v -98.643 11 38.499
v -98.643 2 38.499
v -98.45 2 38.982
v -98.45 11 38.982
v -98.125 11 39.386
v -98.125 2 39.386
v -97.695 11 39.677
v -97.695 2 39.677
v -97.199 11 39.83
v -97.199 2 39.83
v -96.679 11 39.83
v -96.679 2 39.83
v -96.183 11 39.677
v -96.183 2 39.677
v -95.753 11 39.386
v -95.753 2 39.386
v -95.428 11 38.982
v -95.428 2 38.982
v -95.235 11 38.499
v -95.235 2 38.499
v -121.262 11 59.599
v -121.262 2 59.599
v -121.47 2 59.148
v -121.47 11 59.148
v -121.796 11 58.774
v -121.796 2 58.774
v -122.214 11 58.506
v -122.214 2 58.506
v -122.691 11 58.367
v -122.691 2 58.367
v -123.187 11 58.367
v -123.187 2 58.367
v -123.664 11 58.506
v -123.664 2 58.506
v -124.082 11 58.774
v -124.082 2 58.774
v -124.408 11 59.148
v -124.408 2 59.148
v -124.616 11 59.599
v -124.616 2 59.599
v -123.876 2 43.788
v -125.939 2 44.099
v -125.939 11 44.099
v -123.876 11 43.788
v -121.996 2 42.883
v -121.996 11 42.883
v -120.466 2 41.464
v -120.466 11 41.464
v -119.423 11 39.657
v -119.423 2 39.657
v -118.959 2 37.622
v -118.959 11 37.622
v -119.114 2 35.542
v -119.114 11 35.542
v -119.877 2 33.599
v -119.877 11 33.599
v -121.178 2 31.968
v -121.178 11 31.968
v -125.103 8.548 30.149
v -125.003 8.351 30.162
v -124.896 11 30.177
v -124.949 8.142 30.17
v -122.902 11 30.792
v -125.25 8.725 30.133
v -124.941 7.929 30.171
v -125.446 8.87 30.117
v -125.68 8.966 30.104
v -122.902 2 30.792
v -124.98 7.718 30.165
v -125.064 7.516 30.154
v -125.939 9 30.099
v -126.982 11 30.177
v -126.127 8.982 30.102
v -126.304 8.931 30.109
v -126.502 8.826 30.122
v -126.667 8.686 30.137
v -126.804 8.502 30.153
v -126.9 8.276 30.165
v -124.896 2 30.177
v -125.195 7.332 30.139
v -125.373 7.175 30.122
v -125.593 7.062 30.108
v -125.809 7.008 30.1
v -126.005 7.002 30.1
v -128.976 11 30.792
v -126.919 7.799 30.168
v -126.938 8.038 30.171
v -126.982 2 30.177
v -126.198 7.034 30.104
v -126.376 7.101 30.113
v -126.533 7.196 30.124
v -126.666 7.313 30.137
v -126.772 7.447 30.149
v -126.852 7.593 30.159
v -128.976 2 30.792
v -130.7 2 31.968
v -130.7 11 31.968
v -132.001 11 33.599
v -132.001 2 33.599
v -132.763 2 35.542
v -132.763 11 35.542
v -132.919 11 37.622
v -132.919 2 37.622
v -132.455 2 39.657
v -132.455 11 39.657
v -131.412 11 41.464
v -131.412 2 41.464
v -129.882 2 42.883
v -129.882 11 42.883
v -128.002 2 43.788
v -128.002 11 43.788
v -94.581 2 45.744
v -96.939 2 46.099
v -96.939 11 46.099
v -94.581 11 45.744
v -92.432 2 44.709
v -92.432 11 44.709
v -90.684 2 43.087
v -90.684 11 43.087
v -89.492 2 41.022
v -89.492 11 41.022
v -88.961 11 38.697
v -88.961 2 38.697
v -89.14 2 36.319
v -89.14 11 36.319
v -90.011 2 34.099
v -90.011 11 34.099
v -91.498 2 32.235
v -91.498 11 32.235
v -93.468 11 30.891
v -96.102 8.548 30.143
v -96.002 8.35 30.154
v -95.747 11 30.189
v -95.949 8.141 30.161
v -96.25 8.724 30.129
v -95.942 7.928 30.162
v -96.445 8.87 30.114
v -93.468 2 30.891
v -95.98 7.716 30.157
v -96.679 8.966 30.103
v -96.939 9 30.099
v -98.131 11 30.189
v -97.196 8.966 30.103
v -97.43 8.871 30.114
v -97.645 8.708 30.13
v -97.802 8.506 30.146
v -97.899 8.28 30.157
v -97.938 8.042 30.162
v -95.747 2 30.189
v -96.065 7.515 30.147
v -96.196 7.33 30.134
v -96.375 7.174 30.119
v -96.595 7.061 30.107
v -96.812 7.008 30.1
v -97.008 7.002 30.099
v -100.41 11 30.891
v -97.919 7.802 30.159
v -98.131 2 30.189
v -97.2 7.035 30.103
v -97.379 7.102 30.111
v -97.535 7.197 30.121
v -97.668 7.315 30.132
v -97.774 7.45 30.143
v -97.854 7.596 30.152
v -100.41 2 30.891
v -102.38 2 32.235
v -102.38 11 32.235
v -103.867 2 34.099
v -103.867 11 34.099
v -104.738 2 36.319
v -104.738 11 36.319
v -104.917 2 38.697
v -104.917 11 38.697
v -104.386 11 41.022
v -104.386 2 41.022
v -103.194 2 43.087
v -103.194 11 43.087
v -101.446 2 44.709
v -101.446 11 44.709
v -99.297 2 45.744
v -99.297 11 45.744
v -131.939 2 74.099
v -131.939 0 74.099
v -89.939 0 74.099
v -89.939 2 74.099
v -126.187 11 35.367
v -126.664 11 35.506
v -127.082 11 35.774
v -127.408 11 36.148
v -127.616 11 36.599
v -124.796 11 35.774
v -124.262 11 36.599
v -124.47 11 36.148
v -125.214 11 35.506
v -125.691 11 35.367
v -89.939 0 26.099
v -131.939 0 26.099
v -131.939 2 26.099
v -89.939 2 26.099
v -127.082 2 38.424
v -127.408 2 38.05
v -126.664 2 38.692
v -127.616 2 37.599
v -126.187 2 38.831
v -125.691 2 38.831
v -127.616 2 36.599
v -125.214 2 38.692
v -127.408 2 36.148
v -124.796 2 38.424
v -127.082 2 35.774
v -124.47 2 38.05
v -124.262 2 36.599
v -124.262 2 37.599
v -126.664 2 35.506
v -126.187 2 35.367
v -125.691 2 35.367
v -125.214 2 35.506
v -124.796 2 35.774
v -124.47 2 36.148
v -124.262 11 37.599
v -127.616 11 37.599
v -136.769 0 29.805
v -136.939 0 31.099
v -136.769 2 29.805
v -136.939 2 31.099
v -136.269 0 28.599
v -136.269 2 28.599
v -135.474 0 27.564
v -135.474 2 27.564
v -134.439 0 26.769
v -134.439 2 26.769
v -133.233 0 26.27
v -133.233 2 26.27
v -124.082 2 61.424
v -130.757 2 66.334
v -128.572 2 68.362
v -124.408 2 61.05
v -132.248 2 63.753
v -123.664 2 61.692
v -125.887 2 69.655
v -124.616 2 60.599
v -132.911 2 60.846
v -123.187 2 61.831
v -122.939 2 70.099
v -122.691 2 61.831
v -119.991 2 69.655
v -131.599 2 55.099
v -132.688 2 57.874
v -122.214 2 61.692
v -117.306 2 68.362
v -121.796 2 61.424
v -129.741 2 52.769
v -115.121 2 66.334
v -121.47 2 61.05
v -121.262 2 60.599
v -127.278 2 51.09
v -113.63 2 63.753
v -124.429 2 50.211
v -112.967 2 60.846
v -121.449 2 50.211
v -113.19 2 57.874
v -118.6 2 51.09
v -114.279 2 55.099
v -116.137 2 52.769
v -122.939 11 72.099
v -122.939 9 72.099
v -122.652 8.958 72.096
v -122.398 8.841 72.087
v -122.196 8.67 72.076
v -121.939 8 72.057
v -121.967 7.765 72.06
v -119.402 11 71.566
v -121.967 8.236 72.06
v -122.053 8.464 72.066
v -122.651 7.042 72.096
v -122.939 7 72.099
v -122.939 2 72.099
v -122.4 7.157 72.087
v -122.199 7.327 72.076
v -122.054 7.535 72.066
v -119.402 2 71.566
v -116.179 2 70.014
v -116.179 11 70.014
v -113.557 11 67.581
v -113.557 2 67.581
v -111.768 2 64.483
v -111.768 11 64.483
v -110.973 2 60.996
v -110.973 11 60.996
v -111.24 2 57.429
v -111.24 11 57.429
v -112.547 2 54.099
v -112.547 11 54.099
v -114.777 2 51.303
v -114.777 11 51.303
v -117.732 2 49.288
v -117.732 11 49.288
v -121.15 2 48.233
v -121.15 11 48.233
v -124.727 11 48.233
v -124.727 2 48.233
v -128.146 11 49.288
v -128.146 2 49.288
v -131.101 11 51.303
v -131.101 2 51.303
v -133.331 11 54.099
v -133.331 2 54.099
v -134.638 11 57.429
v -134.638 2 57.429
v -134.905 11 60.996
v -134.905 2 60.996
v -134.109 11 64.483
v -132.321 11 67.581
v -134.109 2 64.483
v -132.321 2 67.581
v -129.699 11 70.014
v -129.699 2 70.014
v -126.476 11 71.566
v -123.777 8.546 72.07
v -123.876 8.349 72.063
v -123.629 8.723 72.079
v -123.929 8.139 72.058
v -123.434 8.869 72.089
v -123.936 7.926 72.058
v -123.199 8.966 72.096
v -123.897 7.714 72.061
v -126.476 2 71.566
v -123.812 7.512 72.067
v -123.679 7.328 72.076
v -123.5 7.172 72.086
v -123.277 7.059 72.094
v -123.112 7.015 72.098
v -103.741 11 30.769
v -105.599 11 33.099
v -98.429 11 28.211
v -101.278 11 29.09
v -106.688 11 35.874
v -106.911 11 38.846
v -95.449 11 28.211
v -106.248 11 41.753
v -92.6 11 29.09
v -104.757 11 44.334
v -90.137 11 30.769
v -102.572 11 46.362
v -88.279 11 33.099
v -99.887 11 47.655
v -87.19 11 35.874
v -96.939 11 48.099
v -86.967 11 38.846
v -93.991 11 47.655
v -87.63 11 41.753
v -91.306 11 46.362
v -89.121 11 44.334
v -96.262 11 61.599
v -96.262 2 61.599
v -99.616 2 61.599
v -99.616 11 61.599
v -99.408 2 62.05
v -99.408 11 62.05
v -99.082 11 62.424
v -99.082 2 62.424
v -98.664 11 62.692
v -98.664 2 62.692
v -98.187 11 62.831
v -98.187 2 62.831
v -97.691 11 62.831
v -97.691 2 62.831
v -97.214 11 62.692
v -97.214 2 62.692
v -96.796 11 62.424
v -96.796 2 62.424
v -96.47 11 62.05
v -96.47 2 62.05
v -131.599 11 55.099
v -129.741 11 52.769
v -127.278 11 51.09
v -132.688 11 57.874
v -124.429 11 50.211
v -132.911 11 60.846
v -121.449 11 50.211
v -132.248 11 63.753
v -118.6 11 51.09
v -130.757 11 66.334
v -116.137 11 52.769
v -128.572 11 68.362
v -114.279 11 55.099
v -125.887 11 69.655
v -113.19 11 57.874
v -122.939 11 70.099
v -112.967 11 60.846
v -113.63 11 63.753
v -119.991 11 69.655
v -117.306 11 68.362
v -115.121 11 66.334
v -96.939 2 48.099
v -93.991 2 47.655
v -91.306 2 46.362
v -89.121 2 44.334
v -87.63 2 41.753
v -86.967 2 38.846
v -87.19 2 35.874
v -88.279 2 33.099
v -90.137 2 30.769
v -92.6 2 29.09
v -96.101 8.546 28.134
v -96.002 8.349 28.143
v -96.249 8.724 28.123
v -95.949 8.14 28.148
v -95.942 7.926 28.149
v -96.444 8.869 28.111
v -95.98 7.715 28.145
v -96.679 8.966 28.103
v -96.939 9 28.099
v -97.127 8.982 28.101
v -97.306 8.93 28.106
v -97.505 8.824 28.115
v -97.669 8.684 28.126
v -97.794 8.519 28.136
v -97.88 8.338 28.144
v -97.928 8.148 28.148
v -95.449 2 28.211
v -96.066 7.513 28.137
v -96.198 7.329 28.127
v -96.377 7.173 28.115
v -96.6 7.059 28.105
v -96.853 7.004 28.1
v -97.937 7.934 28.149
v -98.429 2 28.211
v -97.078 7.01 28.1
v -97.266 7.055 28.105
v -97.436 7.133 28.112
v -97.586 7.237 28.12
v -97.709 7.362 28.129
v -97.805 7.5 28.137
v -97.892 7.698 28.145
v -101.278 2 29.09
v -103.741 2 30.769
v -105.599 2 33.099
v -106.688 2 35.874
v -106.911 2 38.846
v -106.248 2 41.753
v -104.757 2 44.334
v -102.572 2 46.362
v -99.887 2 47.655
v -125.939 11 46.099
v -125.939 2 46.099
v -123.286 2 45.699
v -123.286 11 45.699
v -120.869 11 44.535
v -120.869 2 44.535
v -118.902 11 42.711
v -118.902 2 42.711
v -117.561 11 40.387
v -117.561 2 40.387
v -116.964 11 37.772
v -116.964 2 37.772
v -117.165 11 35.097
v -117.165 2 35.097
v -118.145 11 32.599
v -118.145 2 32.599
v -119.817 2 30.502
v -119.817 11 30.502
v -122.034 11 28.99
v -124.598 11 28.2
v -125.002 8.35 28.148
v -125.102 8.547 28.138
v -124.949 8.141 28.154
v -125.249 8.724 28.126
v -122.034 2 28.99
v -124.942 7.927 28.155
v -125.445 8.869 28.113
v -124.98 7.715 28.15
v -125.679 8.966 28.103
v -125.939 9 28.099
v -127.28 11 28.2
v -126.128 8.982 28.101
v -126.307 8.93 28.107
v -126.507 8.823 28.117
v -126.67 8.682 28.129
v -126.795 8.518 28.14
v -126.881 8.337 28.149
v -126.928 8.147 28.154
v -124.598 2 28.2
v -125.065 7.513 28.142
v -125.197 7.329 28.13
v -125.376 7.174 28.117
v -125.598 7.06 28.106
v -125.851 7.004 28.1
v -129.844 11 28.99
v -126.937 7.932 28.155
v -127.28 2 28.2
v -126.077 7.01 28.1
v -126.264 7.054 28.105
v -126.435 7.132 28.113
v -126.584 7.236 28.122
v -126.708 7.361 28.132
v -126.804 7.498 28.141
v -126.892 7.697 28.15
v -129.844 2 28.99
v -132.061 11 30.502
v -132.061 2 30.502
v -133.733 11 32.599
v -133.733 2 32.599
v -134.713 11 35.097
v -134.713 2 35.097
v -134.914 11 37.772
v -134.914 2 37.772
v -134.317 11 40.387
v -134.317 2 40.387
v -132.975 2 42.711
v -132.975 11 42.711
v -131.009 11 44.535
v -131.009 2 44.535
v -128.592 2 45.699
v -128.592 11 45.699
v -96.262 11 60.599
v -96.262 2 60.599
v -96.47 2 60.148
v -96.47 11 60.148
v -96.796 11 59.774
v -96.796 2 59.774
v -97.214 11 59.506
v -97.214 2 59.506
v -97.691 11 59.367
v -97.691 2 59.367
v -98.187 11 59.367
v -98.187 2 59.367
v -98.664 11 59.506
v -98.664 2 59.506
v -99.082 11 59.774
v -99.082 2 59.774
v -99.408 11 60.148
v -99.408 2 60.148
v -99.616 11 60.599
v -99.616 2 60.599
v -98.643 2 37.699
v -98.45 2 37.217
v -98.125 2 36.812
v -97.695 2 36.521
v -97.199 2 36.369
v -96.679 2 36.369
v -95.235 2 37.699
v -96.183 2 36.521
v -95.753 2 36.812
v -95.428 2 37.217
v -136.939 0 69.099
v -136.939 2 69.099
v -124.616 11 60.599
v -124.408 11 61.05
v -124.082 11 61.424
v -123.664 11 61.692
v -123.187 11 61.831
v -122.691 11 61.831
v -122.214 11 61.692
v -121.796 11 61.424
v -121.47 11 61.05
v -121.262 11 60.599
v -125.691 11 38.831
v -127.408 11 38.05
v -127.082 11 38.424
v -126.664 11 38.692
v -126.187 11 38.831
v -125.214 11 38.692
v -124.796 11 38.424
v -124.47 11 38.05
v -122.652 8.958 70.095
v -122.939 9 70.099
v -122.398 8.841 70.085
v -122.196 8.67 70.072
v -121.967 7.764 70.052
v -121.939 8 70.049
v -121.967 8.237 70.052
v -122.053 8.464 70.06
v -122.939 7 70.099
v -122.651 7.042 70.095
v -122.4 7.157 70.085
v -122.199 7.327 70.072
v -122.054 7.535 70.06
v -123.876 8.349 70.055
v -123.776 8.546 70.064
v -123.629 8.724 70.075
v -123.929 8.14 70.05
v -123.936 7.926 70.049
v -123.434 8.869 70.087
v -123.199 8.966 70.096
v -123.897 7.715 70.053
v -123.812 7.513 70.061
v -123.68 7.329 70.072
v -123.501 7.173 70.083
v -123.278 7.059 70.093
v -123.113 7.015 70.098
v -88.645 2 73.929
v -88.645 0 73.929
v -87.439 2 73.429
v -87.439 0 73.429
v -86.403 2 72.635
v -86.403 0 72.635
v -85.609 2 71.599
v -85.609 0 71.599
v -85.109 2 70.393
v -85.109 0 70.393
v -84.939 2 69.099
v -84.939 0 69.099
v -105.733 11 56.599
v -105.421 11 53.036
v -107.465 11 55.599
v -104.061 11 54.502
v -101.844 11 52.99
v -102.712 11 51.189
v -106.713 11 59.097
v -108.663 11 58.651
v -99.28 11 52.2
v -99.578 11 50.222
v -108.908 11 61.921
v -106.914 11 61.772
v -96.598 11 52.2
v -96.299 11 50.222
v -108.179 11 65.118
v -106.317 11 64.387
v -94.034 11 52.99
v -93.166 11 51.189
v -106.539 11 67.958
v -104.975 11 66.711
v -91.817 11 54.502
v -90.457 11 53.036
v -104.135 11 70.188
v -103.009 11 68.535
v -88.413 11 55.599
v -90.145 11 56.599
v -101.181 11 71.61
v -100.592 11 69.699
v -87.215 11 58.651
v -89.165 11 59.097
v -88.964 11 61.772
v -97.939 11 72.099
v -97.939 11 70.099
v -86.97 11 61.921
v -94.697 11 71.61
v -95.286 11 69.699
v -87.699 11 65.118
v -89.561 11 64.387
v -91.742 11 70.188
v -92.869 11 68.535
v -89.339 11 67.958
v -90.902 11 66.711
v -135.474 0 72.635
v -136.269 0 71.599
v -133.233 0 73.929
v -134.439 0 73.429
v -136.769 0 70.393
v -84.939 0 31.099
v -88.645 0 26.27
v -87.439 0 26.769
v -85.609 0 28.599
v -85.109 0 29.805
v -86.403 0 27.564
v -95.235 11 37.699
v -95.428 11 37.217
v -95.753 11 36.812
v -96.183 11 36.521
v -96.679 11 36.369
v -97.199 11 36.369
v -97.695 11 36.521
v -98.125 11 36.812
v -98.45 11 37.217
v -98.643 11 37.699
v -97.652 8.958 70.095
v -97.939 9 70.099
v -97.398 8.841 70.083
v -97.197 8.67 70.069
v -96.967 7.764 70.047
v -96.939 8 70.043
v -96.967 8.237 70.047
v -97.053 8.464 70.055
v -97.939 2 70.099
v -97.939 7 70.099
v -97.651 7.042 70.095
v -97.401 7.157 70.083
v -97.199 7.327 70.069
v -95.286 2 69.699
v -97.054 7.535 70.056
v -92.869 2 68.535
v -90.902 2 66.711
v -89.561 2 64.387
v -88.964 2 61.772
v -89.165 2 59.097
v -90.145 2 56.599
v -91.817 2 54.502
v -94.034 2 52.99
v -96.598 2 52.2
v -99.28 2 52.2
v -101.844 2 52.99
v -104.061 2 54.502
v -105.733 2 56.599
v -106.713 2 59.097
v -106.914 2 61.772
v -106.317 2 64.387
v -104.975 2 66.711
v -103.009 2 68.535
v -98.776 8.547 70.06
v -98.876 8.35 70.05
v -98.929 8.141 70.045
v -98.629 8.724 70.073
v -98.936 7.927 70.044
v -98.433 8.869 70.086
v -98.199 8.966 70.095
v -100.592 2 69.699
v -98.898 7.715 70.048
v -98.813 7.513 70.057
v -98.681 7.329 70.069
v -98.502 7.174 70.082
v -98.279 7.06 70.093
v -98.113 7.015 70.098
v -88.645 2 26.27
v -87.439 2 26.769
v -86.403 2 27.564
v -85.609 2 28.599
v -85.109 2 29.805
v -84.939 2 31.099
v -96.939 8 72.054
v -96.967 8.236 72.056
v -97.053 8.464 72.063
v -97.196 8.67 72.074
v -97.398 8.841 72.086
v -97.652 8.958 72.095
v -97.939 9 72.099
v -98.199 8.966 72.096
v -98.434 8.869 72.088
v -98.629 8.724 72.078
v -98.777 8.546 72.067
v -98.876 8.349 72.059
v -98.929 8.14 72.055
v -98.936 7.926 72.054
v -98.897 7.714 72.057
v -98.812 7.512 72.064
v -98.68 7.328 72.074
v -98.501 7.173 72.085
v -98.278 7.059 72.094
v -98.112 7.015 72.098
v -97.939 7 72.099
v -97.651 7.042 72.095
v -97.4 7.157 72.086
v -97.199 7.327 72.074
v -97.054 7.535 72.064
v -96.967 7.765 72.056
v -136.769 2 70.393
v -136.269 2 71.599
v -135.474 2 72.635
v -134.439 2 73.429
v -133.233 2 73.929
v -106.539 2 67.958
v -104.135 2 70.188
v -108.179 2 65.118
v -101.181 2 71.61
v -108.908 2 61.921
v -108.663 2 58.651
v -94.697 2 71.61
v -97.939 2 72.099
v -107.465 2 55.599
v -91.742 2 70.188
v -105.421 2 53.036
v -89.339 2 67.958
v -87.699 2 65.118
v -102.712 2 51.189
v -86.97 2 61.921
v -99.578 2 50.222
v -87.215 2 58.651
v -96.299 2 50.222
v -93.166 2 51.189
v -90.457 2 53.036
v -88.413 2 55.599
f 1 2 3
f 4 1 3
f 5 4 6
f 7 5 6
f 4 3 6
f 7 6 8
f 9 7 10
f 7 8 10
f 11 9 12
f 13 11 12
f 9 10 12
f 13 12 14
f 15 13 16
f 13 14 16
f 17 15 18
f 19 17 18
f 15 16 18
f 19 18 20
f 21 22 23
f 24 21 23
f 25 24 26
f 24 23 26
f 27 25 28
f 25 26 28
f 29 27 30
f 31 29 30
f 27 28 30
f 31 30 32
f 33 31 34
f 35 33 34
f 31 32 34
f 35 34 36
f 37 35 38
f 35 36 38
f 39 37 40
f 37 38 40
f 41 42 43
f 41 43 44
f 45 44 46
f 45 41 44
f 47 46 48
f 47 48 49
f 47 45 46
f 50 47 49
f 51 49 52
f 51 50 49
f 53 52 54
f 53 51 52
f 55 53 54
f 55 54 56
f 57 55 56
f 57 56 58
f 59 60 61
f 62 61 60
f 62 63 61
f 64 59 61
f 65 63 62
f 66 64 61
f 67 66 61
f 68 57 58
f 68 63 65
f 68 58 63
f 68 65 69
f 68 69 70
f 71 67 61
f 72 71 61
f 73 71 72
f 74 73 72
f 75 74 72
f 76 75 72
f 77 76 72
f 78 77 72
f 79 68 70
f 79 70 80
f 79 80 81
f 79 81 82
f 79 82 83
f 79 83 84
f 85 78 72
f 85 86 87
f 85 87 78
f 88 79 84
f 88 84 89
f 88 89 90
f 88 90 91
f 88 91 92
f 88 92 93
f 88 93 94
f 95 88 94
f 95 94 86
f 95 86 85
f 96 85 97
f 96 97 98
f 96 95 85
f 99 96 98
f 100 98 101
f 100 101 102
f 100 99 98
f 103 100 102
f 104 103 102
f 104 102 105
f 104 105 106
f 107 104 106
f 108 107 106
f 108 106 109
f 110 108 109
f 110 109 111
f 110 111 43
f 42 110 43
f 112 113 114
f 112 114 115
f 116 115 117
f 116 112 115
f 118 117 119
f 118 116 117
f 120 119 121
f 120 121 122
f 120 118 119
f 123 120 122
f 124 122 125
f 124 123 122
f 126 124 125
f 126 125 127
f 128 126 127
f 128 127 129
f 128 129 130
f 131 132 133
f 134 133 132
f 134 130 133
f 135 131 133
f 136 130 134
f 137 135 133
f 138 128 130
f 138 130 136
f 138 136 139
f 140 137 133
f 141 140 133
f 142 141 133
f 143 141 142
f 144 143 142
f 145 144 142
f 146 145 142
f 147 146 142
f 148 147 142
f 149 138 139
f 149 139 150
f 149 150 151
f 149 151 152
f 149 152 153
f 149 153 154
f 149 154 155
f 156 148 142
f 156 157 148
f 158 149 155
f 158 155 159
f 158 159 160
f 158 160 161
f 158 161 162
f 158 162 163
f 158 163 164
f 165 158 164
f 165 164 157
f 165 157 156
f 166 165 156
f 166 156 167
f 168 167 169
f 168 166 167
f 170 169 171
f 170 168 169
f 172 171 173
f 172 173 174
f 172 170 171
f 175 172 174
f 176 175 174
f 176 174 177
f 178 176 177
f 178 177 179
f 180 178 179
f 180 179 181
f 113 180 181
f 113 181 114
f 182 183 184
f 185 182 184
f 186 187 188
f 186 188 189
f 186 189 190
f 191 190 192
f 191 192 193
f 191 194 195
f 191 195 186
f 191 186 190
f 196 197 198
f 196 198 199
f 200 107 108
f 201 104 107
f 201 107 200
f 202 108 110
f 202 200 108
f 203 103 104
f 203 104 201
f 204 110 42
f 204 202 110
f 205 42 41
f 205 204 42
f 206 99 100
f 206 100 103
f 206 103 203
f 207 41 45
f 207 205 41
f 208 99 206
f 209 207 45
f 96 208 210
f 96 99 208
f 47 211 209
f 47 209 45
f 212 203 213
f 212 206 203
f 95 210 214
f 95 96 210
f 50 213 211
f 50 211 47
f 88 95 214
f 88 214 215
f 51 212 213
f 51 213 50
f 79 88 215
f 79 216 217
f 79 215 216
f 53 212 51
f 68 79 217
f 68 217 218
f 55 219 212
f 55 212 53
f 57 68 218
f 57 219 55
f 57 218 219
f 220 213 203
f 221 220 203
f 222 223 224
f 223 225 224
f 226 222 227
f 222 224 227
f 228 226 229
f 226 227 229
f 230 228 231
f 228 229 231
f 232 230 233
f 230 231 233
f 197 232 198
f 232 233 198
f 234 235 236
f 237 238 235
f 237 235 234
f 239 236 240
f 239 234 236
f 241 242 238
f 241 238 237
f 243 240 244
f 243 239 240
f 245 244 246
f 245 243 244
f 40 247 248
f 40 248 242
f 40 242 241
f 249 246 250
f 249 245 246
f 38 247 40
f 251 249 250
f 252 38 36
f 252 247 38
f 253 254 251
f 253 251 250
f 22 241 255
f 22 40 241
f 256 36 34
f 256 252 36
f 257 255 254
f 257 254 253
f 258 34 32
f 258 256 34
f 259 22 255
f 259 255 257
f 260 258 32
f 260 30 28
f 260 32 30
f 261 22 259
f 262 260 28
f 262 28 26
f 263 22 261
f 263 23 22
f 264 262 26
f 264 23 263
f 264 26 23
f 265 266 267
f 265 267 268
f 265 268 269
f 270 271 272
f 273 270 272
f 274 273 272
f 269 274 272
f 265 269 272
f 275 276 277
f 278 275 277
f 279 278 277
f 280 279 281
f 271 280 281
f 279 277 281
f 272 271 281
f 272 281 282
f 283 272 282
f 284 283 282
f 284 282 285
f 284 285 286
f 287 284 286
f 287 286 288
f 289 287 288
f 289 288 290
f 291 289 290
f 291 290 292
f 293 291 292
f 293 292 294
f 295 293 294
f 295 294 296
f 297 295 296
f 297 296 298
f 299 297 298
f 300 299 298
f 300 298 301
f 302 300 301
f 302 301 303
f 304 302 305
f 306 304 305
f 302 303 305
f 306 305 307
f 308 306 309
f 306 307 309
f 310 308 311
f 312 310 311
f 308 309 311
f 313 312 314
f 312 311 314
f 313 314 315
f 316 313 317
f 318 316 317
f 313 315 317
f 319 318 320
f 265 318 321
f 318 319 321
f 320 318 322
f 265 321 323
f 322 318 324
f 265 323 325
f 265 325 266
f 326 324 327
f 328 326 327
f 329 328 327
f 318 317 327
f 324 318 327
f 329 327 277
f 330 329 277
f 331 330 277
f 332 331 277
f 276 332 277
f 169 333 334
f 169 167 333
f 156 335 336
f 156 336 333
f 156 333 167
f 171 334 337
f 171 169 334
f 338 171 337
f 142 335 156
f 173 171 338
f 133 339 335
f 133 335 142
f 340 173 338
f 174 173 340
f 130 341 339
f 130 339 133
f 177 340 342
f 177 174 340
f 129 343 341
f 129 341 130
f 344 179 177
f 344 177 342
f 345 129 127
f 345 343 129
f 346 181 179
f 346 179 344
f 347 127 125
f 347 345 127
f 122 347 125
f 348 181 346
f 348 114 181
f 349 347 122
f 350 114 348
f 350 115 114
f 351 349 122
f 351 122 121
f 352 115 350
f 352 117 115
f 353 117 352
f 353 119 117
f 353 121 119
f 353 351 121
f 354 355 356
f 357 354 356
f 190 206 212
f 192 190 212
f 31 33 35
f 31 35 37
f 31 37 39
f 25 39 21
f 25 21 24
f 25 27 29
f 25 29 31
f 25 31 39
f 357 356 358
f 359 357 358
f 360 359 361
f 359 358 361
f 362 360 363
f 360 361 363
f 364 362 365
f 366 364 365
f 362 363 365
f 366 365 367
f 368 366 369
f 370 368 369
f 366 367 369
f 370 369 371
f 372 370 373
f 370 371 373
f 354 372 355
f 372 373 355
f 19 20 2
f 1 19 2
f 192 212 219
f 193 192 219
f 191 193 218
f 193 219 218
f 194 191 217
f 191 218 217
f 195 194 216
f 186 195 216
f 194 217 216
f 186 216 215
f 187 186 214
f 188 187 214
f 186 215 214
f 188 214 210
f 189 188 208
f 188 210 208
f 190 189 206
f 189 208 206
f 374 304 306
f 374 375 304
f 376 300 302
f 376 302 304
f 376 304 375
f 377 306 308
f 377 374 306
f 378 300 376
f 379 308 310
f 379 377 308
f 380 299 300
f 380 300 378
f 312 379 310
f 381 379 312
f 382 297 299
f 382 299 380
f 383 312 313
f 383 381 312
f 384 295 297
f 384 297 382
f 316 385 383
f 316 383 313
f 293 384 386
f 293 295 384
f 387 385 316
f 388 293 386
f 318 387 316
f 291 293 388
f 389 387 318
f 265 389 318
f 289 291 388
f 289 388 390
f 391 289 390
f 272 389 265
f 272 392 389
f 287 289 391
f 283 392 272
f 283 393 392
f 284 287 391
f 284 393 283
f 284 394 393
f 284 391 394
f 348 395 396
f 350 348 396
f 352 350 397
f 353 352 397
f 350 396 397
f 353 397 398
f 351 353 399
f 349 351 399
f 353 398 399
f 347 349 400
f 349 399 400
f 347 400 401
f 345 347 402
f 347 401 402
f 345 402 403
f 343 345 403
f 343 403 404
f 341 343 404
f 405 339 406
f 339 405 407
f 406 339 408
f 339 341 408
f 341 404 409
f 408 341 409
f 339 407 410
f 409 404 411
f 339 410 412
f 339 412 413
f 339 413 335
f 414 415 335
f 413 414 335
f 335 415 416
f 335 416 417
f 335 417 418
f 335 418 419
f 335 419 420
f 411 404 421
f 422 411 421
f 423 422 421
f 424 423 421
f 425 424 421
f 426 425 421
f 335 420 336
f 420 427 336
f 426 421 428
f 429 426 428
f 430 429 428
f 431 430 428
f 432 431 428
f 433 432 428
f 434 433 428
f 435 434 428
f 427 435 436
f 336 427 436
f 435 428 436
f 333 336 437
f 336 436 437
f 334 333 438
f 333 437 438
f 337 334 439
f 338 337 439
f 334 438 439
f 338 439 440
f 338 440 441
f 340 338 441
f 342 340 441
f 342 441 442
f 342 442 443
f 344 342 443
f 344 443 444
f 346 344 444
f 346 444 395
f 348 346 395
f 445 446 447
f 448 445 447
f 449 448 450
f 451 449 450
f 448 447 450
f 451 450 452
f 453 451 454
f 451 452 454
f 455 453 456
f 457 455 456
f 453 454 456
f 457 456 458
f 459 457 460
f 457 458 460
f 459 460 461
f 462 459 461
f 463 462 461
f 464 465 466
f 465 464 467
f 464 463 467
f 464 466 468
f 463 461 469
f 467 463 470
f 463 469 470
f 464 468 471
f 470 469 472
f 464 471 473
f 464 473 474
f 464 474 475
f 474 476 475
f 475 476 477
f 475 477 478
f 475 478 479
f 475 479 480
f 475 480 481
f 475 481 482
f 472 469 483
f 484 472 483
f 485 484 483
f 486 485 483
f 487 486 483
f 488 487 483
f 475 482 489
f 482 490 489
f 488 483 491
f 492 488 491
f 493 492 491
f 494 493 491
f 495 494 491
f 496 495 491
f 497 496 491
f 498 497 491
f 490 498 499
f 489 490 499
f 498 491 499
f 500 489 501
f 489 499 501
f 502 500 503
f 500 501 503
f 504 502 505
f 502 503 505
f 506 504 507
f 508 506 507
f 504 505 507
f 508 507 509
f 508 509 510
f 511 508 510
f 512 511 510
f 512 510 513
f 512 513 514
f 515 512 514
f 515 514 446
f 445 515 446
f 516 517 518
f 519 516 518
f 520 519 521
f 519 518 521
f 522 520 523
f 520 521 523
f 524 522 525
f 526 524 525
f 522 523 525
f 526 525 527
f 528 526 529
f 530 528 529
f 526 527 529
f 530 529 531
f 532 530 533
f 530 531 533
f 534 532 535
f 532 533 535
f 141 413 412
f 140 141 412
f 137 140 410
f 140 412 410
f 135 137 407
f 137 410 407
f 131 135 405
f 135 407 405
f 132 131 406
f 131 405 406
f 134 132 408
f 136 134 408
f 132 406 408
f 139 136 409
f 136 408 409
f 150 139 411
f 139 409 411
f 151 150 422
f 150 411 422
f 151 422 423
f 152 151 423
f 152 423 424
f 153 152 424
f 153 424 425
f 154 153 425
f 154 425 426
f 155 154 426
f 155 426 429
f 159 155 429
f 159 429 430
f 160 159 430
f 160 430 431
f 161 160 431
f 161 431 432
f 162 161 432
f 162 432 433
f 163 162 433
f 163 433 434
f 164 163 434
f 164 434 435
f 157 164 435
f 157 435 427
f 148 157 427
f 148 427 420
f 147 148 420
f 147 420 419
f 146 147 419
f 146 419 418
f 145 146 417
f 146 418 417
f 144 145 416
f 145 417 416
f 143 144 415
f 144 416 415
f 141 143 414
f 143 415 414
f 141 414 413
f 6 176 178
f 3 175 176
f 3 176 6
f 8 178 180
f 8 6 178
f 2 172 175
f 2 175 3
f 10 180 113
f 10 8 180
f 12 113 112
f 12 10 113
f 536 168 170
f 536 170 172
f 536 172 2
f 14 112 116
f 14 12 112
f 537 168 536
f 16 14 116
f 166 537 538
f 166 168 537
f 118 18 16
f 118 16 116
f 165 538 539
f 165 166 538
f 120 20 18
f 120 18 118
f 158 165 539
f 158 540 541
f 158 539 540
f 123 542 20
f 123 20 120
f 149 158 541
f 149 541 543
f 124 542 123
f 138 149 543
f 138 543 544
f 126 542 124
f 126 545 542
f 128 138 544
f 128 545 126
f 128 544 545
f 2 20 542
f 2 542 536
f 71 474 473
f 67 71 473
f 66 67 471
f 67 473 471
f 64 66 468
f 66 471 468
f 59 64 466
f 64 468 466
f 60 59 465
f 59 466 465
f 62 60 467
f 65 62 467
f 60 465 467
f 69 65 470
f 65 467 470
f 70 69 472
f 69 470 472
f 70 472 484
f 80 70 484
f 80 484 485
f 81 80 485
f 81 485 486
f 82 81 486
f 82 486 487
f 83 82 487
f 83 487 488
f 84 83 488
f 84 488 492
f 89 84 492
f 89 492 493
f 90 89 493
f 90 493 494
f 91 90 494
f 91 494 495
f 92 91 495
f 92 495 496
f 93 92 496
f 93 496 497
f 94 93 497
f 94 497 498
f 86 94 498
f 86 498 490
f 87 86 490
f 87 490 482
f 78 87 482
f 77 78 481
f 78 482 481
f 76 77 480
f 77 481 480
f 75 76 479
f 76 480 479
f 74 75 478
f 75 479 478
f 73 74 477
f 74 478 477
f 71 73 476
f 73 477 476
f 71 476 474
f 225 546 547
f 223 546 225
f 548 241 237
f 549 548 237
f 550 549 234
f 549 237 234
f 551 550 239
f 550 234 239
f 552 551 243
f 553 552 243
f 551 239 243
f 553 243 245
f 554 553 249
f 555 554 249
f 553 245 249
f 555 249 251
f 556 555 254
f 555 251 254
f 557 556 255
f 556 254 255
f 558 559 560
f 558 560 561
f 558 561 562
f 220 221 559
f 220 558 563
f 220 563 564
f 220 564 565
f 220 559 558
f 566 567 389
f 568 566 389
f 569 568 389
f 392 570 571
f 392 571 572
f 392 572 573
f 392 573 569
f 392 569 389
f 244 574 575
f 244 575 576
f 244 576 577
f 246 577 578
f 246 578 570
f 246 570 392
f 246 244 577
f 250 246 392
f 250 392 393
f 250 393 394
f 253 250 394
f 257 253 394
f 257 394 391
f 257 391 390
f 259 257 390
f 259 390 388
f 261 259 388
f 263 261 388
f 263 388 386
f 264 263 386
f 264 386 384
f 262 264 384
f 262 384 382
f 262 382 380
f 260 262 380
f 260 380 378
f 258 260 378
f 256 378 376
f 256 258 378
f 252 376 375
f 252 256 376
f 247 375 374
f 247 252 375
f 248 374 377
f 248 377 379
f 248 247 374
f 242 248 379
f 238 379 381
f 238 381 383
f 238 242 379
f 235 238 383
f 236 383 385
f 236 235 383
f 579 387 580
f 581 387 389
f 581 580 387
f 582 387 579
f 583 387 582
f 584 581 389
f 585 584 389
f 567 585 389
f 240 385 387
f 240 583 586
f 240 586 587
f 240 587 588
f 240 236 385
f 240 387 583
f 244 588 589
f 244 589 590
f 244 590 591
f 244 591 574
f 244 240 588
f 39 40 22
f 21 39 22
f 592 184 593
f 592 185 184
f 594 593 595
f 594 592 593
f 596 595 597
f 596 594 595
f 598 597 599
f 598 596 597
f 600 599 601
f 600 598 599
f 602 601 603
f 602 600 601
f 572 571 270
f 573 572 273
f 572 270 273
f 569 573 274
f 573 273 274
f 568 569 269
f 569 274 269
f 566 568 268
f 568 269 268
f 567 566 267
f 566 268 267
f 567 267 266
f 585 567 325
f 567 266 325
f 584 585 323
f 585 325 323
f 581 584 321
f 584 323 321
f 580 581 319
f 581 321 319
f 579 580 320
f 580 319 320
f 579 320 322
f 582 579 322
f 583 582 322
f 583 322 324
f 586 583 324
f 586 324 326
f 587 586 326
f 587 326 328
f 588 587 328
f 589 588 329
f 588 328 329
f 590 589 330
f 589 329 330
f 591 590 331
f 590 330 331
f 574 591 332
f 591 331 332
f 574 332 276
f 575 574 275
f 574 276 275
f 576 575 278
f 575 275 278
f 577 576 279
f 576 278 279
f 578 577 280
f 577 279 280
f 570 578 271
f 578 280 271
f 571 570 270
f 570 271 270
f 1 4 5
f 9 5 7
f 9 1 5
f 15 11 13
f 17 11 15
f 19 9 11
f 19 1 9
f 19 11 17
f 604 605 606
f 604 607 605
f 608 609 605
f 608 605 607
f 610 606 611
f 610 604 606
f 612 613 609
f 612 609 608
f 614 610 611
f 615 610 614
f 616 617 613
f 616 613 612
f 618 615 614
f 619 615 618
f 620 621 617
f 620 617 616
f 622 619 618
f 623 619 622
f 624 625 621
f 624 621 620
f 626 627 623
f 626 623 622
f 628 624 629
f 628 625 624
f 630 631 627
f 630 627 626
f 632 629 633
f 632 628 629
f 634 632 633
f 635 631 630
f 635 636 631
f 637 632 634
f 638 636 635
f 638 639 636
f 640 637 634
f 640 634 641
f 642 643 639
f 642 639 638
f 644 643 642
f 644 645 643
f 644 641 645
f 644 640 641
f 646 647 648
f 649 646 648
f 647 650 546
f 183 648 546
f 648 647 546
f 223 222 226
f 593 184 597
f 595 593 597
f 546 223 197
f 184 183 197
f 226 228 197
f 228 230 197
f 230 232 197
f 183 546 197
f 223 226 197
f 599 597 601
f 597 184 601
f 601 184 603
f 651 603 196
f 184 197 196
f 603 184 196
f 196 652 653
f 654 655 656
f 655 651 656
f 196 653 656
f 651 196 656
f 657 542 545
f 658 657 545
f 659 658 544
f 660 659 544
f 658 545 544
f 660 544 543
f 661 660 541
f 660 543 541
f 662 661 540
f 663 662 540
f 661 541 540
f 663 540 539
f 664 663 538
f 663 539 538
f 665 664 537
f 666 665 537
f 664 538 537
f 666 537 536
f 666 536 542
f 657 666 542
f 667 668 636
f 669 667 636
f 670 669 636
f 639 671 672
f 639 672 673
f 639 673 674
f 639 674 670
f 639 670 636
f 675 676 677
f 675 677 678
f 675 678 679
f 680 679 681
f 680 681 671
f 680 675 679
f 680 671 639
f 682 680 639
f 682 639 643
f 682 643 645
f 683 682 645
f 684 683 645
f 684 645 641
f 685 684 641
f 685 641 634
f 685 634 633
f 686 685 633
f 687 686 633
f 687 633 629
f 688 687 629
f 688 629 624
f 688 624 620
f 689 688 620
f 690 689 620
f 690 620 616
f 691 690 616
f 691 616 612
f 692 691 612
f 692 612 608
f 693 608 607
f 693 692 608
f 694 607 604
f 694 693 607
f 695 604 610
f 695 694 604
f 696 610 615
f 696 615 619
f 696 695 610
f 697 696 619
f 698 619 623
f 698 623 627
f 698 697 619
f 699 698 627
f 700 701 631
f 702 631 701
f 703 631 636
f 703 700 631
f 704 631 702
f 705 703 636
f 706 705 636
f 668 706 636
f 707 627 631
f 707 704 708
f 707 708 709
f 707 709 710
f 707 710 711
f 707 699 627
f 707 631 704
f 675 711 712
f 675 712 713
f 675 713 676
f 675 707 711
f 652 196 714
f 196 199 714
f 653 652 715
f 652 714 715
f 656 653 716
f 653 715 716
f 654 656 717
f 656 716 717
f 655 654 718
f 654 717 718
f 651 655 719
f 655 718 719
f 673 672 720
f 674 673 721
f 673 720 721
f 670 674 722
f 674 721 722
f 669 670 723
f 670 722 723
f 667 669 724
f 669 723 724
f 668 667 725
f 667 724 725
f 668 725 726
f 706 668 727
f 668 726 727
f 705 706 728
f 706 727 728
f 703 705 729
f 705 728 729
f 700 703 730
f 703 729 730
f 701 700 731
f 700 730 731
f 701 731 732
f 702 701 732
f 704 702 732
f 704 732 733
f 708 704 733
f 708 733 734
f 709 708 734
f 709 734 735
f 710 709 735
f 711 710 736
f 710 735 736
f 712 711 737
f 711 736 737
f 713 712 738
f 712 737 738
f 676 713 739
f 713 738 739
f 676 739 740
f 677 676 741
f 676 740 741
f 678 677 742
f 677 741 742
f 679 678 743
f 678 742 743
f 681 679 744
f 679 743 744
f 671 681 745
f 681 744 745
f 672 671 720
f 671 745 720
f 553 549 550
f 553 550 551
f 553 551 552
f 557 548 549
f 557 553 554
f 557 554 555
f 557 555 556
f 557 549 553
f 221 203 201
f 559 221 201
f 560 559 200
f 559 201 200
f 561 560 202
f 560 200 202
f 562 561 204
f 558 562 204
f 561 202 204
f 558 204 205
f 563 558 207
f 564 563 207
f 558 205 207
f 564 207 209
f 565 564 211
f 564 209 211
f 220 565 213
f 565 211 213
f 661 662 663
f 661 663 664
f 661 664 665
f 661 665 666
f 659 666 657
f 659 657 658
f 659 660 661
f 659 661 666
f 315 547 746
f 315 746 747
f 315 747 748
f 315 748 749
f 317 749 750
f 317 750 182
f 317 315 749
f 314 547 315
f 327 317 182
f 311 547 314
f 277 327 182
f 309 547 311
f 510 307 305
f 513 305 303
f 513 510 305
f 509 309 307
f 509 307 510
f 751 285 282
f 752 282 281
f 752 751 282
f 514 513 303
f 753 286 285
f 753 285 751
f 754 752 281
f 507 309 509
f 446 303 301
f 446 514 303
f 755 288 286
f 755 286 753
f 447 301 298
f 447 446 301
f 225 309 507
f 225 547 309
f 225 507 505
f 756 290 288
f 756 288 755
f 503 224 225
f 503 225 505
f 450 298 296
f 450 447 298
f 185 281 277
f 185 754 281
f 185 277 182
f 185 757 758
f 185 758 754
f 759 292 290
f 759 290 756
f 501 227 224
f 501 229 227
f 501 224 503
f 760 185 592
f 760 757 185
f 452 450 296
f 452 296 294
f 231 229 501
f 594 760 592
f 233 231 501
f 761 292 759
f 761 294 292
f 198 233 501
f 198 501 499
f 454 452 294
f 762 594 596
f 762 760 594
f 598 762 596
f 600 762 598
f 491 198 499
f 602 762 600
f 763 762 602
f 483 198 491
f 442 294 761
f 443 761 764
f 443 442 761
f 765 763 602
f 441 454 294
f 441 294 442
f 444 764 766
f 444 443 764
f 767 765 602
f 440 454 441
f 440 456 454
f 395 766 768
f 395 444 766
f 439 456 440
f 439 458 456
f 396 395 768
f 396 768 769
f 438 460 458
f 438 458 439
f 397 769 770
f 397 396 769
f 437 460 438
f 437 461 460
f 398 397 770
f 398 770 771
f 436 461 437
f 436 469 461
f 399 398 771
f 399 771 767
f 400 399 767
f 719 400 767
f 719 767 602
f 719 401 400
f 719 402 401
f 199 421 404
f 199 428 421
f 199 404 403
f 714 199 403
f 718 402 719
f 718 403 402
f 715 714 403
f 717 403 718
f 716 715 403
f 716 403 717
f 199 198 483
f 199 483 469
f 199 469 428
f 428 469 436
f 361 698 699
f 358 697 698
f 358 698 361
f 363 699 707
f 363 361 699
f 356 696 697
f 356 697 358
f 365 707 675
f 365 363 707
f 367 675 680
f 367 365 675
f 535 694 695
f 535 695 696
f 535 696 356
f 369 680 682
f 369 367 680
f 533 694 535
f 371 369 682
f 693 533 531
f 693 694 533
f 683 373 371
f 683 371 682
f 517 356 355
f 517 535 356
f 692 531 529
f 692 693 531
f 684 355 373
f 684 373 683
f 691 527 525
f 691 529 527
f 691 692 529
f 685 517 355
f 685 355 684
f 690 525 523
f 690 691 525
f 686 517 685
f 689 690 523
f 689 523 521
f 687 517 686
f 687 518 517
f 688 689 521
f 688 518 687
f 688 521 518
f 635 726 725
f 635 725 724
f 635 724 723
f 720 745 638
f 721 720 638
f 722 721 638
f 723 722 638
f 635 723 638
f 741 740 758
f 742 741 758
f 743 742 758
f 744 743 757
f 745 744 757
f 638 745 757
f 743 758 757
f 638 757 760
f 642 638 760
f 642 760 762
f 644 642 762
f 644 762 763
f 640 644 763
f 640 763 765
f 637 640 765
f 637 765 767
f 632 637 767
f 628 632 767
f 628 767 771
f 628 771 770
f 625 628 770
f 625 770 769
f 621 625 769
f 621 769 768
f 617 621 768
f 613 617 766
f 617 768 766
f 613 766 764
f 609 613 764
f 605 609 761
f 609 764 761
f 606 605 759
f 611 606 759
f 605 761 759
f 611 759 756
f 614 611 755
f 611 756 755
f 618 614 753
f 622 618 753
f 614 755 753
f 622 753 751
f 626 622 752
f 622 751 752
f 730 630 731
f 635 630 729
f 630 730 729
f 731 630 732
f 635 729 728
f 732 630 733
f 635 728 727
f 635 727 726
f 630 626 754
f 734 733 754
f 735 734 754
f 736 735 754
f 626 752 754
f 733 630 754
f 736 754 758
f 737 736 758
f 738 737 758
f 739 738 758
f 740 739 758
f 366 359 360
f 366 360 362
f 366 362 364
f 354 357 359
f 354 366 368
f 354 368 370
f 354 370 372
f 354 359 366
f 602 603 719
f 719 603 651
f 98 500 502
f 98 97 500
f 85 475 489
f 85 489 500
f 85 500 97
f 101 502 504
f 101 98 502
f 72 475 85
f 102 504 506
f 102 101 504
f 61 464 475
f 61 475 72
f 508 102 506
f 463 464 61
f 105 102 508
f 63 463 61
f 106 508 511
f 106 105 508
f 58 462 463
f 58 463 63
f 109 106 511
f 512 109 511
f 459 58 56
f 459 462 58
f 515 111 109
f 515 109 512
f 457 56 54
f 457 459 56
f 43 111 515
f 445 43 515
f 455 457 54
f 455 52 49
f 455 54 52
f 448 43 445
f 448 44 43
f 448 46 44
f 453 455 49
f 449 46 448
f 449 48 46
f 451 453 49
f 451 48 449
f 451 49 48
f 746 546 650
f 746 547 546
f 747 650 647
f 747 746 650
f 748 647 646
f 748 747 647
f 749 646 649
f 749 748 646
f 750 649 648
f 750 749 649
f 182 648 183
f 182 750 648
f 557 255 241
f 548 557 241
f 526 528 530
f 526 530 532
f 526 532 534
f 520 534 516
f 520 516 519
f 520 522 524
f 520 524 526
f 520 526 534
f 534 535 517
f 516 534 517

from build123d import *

# Parameters (mm, degrees)
SKETCH1_W           = 52
SKETCH1_H           = 48
BOSS_EXTRUDE3_DEPTH = 2
SKETCH4_R           = 9
SKETCH4_R_2         = 7
SKETCH4_R_3         = 10
SKETCH4_R_4         = 8
SKETCH4_R_5         = 11
SKETCH4_R_6         = 12
BOSS_EXTRUDE4_DEPTH = 9
BOSS_EXTRUDE5_DEPTH = 9
SKETCH6_R           = 1
CUT_EXTRUDE2_DEPTH  = 6
SKETCH7_R           = 1
CUT_EXTRUDE3_DEPTH  = 6
FILLET1_R           = 5


with BuildPart() as part:
    # Sketch1 → Boss-Extrude3 (new body)
    with BuildSketch(Plane(origin=(0, 0, 0), x_dir=(1, 0, 0), z_dir=(0, 1, 0))):
        with Locations((-110.938964427, -50.099195195)):
            Rectangle(SKETCH1_W, SKETCH1_H)
    extrude(amount=BOSS_EXTRUDE3_DEPTH)

    # Sketch4 → Boss-Extrude4 (add)
    # profile 1 of 4: a face of its own
    with BuildSketch(Plane(origin=(0, 2, 0), x_dir=(1, 0, 0), z_dir=(0, 1, 0))):
        with Locations(Location((-125.938964427, -37.099195195, 0), (0, 0, 270))):
            Circle(SKETCH4_R)
        with Locations(Location((-125.938964427, -37.099195195, 0), (0, 0, 270))):
            Circle(SKETCH4_R_2, mode=Mode.SUBTRACT)
    # profile 2 of 4: a face of its own
    with BuildSketch(Plane(origin=(0, 2, 0), x_dir=(1, 0, 0), z_dir=(0, 1, 0))):
        with Locations(Location((-96.938964427, -38.099195195, 0), (0, 0, 270))):
            Circle(SKETCH4_R_3)
        with Locations(Location((-96.938964427, -38.099195195, 0), (0, 0, 270))):
            Circle(SKETCH4_R_4, mode=Mode.SUBTRACT)
    # profile 3 of 4: a face of its own
    with BuildSketch(Plane(origin=(0, 2, 0), x_dir=(1, 0, 0), z_dir=(0, 1, 0))):
        with Locations(Location((-97.938964427, -61.099195195, 0), (0, 0, 270))):
            Circle(SKETCH4_R_5)
        with Locations(Location((-97.938964427, -61.099195195, 0), (0, 0, 270))):
            Circle(SKETCH4_R, mode=Mode.SUBTRACT)
    # profile 4 of 4: a face of its own
    with BuildSketch(Plane(origin=(0, 2, 0), x_dir=(1, 0, 0), z_dir=(0, 1, 0))):
        with Locations(Location((-122.938964427, -60.099195195, 0), (0, 0, 270))):
            Circle(SKETCH4_R_6)
        with Locations(Location((-122.938964427, -60.099195195, 0), (0, 0, 270))):
            Circle(SKETCH4_R_3, mode=Mode.SUBTRACT)
    extrude(amount=BOSS_EXTRUDE4_DEPTH)

    # Sketch5 → Boss-Extrude5 (add)
    with BuildSketch(Plane(origin=(0, 2, 0), x_dir=(1, 0, 0), z_dir=(0, 1, 0))):
        with BuildLine():
            Line((-124.61601541, -59.599195195), (-122.938964427, -59.599195195))
            Line((-122.938964427, -59.599195195), (-121.261913444, -59.599195195))
            ThreePointArc((-121.261913444, -59.599195195), (-122.938964427, -58.349195195), (-124.61601541, -59.599195195))
        make_face()
        with BuildLine():
            Line((-121.261913444, -60.599195195), (-124.61601541, -60.599195195))
            ThreePointArc((-124.61601541, -60.599195195), (-122.938964427, -61.849195195), (-121.261913444, -60.599195195))
        make_face()
        with BuildLine():
            Line((-99.61601541, -60.599195195), (-97.938964427, -60.599195195))
            Line((-97.938964427, -60.599195195), (-96.261913444, -60.599195195))
            ThreePointArc((-96.261913444, -60.599195195), (-97.938964427, -59.349195195), (-99.61601541, -60.599195195))
        make_face()
        with BuildLine():
            Line((-96.261913444, -61.599195195), (-99.61601541, -61.599195195))
            ThreePointArc((-99.61601541, -61.599195195), (-97.938964427, -62.849195195), (-96.261913444, -61.599195195))
        make_face()
        with BuildLine():
            Line((-98.642636931, -37.699195195), (-96.938964427, -37.699195195))
            Line((-96.938964427, -37.699195195), (-95.235291923, -37.699195195))
            ThreePointArc((-95.235291923, -37.699195195), (-96.938964427, -36.349195195), (-98.642636931, -37.699195195))
        make_face()
        with BuildLine():
            Line((-95.235291923, -38.499195195), (-98.642636931, -38.499195195))
            ThreePointArc((-98.642636931, -38.499195195), (-96.938964427, -39.849195195), (-95.235291923, -38.499195195))
        make_face()
        with BuildLine():
            Line((-127.61601541, -36.599195195), (-125.938964427, -36.599195195))
            Line((-125.938964427, -36.599195195), (-124.261913444, -36.599195195))
            ThreePointArc((-124.261913444, -36.599195195), (-125.938964427, -35.349195195), (-127.61601541, -36.599195195))
        make_face()
        with BuildLine():
            Line((-124.261913444, -37.599195195), (-127.61601541, -37.599195195))
            ThreePointArc((-127.61601541, -37.599195195), (-125.938964427, -38.849195195), (-124.261913444, -37.599195195))
        make_face()
    extrude(amount=BOSS_EXTRUDE5_DEPTH)

    # Sketch6 → Cut-Extrude2 (cut)
    with BuildSketch(Plane.XY.offset(74.099195195)):
        with Locations((-97.938964427, 8)):
            Circle(SKETCH6_R)
        with Locations((-122.938964427, 8)):
            Circle(SKETCH6_R)
    extrude(amount=-CUT_EXTRUDE2_DEPTH, mode=Mode.SUBTRACT)

    # Sketch7 → Cut-Extrude3 (cut)
    with BuildSketch(Plane(origin=(0, 0, 26.099195195), x_dir=(-1, 0, 0), z_dir=(0, 0, -1))):
        with Locations(Location((96.938964427, 8, 0), (0, 0, 90))):
            Circle(SKETCH7_R)
        with Locations(Location((125.938964427, 8, 0), (0, 0, 90))):
            Circle(SKETCH7_R)
    extrude(amount=-CUT_EXTRUDE3_DEPTH, mode=Mode.SUBTRACT)

    # Fillet1
    fillet1_edges = [part.edges().sort_by_distance(p)[0] for p in [
        (-136.938964427, 1, 26.099195195),
        (-84.938964427, 1, 26.099195195),
        (-84.938964427, 1, 74.099195195),
        (-136.938964427, 1, 74.099195195),
    ]]
    fillet(fillet1_edges, radius=FILLET1_R)


solid = part.part
